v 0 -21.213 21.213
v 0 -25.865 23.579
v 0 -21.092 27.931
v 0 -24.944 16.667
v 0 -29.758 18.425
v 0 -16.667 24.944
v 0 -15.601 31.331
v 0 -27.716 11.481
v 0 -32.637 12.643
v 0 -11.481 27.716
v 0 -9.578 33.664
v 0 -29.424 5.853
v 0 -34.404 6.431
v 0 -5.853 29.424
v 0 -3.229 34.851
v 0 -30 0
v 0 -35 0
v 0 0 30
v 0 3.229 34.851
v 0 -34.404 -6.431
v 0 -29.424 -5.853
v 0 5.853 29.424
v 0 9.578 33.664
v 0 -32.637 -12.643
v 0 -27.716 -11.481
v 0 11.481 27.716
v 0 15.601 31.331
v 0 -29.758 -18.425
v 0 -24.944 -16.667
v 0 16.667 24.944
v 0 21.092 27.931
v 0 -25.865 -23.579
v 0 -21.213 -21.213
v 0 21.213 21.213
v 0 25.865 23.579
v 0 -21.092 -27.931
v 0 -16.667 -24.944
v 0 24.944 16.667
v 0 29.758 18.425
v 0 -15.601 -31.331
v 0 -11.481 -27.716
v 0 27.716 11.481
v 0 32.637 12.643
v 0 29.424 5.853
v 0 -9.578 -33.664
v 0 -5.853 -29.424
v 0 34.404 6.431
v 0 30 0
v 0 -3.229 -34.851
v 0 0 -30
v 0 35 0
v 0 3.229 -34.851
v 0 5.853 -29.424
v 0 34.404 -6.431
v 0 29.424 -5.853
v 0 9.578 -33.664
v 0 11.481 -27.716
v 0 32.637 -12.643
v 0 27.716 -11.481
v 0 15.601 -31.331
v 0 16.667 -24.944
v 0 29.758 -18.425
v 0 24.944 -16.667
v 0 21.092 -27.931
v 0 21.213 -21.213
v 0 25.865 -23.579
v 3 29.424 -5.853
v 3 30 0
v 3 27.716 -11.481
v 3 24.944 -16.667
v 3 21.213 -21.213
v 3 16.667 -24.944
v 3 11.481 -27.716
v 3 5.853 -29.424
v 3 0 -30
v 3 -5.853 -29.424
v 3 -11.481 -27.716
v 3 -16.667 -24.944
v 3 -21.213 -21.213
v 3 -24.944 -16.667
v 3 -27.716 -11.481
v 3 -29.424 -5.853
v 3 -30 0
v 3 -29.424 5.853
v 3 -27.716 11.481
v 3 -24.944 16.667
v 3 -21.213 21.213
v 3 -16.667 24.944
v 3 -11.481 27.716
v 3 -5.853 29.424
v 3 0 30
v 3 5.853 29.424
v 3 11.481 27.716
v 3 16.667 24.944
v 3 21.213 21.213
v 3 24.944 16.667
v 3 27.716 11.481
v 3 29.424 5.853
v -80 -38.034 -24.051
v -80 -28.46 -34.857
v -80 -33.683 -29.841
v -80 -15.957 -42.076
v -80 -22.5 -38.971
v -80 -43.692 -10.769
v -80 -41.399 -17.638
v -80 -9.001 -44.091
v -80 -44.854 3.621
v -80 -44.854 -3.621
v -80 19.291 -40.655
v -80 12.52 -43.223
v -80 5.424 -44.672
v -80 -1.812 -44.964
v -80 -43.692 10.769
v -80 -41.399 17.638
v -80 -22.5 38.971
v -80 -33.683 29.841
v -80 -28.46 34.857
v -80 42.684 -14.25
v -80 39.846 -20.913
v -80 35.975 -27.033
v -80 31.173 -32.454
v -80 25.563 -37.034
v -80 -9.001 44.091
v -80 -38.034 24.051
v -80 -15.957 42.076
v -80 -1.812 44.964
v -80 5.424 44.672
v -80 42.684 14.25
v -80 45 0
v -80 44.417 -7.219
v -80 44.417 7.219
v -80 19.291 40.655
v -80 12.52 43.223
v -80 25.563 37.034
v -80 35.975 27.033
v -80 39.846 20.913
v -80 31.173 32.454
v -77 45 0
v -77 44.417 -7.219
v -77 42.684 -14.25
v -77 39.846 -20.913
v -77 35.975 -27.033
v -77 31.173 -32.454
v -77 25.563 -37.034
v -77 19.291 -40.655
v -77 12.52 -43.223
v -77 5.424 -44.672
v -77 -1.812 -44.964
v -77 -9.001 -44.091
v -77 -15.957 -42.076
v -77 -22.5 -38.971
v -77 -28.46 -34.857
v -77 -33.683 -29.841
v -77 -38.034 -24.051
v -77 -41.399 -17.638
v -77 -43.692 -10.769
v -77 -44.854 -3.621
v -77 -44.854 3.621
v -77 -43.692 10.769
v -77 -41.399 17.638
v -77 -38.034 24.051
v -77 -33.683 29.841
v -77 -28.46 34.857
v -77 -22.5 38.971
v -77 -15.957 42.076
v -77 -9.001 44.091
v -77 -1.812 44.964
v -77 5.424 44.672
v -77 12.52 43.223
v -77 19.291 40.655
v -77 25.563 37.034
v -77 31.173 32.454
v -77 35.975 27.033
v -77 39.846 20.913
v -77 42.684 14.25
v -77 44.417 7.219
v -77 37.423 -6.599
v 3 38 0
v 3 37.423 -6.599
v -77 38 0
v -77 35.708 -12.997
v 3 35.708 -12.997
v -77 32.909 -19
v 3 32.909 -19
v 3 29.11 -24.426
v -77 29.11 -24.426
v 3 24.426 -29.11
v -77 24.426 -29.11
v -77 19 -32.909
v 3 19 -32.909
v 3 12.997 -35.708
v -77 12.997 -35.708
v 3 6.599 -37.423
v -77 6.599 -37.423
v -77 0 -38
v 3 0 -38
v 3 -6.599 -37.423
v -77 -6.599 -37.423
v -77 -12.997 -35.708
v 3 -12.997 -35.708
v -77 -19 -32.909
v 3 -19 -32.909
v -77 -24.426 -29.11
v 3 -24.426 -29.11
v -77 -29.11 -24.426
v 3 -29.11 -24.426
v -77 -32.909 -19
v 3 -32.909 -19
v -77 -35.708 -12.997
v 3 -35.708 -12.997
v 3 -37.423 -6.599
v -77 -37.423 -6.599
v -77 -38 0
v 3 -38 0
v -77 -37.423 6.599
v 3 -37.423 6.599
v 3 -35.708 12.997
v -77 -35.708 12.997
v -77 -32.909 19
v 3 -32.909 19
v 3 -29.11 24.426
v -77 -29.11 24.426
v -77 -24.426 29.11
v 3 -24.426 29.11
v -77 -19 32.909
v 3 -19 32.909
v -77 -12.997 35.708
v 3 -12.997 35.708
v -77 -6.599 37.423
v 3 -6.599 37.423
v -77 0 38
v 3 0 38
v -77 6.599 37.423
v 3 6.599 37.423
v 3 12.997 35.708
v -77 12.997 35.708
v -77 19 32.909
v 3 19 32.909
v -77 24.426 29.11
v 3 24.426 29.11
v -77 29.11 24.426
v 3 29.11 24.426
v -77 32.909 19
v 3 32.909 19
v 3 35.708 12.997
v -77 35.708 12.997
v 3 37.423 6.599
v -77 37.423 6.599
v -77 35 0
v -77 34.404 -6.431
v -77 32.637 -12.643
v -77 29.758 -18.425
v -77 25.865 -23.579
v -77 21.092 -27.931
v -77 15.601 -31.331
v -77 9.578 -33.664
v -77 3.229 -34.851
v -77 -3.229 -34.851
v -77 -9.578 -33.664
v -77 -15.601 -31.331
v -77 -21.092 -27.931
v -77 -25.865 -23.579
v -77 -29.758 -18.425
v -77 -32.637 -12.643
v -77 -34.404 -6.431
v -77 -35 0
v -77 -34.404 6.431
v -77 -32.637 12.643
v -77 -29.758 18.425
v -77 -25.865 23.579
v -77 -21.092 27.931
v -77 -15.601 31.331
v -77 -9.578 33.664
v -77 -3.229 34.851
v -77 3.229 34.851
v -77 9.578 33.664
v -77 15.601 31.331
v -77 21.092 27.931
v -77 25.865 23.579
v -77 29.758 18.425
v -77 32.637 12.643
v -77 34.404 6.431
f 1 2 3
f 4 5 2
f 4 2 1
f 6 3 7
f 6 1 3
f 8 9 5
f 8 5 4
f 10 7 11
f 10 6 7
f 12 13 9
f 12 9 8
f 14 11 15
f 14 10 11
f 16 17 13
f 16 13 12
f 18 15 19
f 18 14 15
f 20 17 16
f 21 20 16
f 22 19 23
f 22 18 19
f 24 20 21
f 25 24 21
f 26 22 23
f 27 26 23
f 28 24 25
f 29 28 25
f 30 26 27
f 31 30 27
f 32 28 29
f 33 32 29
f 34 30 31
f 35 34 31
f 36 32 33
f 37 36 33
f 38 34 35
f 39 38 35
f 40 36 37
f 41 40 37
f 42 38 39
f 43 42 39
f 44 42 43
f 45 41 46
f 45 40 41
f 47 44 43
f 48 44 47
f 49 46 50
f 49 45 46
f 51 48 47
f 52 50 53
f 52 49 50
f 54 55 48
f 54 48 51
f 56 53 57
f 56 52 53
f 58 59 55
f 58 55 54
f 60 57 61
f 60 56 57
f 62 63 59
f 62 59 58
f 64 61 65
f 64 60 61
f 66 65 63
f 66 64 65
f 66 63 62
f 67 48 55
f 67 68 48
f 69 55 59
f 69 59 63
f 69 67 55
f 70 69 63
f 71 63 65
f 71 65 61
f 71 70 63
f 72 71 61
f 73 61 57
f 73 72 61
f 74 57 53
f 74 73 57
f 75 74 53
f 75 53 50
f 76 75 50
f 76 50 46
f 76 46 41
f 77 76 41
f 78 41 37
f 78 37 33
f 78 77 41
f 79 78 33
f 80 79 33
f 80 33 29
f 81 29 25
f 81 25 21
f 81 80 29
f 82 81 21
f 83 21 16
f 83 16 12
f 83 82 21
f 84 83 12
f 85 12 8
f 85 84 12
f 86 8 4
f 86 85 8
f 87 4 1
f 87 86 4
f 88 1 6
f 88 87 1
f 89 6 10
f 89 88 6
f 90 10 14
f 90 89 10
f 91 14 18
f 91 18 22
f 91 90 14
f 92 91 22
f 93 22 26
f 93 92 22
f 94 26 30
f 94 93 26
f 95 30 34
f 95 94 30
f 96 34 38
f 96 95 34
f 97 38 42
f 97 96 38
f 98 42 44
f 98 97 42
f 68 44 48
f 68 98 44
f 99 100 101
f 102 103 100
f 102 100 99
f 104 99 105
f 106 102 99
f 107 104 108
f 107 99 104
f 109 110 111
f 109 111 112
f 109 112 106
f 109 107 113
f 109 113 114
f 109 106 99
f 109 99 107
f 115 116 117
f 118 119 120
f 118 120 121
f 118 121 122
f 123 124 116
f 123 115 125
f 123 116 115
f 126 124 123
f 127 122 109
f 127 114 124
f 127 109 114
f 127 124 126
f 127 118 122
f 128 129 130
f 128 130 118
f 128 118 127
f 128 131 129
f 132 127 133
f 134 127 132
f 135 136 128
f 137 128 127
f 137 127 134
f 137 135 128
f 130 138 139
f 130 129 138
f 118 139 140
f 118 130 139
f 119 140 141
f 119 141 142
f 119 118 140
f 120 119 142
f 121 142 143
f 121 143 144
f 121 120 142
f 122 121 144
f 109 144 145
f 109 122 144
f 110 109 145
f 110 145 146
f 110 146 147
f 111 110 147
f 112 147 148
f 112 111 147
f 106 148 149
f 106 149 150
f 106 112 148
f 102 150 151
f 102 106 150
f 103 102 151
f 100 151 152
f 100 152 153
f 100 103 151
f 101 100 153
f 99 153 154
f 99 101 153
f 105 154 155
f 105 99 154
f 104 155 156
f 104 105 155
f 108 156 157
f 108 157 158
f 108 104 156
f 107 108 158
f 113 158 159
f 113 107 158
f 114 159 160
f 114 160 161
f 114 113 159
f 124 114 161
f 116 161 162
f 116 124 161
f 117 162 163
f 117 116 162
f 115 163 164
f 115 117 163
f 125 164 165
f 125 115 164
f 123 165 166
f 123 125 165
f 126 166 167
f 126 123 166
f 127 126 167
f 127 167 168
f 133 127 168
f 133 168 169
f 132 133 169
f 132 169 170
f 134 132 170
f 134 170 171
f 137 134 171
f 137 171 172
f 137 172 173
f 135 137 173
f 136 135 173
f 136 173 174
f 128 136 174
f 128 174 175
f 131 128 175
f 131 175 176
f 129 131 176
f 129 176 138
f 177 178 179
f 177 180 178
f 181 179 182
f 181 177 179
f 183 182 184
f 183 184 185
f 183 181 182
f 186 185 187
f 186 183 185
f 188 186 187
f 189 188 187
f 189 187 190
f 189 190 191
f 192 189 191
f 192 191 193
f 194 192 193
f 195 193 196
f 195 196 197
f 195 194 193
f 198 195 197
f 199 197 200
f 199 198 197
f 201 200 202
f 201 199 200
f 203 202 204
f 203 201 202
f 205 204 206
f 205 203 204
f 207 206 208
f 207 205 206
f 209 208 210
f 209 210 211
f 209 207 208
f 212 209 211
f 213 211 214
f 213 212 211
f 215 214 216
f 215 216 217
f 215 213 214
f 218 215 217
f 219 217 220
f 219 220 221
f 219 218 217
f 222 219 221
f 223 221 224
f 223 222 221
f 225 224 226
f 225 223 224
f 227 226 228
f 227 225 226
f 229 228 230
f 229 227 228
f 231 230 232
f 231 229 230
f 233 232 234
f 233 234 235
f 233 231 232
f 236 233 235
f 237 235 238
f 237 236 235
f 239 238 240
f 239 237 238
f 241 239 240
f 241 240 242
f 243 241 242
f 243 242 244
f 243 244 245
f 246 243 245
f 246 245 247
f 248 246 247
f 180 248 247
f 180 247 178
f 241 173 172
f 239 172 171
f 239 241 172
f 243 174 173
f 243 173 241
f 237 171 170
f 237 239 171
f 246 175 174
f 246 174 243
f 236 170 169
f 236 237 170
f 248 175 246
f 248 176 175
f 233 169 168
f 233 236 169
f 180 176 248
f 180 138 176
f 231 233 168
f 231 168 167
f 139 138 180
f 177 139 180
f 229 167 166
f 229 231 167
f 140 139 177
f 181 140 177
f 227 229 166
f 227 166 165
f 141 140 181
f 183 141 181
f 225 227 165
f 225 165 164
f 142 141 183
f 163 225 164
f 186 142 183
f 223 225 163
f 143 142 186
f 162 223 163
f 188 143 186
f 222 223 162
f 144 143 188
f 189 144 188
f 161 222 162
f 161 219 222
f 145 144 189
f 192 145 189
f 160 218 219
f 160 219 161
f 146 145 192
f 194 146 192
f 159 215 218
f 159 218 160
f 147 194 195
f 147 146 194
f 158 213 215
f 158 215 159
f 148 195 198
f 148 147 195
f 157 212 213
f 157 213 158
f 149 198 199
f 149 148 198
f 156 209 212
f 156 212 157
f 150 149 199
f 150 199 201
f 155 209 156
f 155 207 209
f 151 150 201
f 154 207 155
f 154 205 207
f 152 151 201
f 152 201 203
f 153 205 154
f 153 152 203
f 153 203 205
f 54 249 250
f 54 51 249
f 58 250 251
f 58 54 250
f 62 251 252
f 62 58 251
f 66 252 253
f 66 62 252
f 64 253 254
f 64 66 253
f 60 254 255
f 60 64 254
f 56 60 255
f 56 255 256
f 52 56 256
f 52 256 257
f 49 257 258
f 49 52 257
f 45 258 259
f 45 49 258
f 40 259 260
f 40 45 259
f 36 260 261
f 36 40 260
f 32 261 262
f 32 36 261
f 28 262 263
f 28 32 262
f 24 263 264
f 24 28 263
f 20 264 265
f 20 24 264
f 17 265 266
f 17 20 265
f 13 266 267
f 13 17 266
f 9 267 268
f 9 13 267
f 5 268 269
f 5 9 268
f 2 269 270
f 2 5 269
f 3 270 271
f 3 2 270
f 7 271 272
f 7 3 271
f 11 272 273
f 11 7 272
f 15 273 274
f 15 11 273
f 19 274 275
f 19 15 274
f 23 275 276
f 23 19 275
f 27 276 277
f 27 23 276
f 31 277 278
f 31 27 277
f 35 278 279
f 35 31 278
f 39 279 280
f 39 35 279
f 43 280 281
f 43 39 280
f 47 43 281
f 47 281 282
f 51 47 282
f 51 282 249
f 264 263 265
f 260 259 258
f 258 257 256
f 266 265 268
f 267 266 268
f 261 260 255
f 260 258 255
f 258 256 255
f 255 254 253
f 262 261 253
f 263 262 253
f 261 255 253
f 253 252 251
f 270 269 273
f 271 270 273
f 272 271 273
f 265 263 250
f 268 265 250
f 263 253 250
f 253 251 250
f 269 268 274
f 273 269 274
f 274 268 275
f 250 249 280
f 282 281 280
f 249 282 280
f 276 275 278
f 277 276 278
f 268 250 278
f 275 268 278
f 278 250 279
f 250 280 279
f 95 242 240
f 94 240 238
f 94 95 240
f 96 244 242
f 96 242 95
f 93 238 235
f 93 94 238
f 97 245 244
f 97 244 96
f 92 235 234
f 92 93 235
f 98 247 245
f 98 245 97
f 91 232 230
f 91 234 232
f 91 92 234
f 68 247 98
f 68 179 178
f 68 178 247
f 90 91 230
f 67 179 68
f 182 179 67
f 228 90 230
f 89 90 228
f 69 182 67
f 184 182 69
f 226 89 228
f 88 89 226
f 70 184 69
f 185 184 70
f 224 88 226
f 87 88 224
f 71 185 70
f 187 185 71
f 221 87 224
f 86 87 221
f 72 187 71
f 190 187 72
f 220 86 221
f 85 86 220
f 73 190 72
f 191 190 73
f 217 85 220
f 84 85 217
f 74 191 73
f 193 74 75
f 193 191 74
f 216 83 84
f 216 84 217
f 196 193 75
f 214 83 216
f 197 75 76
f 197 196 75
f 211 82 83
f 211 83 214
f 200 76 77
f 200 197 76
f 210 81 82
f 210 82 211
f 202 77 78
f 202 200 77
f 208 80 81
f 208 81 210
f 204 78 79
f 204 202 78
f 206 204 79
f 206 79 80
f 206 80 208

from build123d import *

# Parameters (mm, degrees)
SKETCH2_R           = 35
BOSS_EXTRUDE1_DEPTH = 3


with BuildPart() as part:
    # Sketch1 → Revolve-Thin1 (revolve)
    with BuildSketch(Plane.XY):
        Polygon((-80, 45), (-80, 35), (0, 35), (0, 30), (3, 30), (3, 38), (-77, 38), (-77, 45), align=None)
    revolve(axis=Axis((0, 0, 0), (-1, 0, 0)))

    # Sketch2 → Boss-Extrude1 (add)
    with BuildSketch(Plane.ZY.offset(80)):
        Circle(SKETCH2_R)
    extrude(amount=-BOSS_EXTRUDE1_DEPTH)


solid = part.part
